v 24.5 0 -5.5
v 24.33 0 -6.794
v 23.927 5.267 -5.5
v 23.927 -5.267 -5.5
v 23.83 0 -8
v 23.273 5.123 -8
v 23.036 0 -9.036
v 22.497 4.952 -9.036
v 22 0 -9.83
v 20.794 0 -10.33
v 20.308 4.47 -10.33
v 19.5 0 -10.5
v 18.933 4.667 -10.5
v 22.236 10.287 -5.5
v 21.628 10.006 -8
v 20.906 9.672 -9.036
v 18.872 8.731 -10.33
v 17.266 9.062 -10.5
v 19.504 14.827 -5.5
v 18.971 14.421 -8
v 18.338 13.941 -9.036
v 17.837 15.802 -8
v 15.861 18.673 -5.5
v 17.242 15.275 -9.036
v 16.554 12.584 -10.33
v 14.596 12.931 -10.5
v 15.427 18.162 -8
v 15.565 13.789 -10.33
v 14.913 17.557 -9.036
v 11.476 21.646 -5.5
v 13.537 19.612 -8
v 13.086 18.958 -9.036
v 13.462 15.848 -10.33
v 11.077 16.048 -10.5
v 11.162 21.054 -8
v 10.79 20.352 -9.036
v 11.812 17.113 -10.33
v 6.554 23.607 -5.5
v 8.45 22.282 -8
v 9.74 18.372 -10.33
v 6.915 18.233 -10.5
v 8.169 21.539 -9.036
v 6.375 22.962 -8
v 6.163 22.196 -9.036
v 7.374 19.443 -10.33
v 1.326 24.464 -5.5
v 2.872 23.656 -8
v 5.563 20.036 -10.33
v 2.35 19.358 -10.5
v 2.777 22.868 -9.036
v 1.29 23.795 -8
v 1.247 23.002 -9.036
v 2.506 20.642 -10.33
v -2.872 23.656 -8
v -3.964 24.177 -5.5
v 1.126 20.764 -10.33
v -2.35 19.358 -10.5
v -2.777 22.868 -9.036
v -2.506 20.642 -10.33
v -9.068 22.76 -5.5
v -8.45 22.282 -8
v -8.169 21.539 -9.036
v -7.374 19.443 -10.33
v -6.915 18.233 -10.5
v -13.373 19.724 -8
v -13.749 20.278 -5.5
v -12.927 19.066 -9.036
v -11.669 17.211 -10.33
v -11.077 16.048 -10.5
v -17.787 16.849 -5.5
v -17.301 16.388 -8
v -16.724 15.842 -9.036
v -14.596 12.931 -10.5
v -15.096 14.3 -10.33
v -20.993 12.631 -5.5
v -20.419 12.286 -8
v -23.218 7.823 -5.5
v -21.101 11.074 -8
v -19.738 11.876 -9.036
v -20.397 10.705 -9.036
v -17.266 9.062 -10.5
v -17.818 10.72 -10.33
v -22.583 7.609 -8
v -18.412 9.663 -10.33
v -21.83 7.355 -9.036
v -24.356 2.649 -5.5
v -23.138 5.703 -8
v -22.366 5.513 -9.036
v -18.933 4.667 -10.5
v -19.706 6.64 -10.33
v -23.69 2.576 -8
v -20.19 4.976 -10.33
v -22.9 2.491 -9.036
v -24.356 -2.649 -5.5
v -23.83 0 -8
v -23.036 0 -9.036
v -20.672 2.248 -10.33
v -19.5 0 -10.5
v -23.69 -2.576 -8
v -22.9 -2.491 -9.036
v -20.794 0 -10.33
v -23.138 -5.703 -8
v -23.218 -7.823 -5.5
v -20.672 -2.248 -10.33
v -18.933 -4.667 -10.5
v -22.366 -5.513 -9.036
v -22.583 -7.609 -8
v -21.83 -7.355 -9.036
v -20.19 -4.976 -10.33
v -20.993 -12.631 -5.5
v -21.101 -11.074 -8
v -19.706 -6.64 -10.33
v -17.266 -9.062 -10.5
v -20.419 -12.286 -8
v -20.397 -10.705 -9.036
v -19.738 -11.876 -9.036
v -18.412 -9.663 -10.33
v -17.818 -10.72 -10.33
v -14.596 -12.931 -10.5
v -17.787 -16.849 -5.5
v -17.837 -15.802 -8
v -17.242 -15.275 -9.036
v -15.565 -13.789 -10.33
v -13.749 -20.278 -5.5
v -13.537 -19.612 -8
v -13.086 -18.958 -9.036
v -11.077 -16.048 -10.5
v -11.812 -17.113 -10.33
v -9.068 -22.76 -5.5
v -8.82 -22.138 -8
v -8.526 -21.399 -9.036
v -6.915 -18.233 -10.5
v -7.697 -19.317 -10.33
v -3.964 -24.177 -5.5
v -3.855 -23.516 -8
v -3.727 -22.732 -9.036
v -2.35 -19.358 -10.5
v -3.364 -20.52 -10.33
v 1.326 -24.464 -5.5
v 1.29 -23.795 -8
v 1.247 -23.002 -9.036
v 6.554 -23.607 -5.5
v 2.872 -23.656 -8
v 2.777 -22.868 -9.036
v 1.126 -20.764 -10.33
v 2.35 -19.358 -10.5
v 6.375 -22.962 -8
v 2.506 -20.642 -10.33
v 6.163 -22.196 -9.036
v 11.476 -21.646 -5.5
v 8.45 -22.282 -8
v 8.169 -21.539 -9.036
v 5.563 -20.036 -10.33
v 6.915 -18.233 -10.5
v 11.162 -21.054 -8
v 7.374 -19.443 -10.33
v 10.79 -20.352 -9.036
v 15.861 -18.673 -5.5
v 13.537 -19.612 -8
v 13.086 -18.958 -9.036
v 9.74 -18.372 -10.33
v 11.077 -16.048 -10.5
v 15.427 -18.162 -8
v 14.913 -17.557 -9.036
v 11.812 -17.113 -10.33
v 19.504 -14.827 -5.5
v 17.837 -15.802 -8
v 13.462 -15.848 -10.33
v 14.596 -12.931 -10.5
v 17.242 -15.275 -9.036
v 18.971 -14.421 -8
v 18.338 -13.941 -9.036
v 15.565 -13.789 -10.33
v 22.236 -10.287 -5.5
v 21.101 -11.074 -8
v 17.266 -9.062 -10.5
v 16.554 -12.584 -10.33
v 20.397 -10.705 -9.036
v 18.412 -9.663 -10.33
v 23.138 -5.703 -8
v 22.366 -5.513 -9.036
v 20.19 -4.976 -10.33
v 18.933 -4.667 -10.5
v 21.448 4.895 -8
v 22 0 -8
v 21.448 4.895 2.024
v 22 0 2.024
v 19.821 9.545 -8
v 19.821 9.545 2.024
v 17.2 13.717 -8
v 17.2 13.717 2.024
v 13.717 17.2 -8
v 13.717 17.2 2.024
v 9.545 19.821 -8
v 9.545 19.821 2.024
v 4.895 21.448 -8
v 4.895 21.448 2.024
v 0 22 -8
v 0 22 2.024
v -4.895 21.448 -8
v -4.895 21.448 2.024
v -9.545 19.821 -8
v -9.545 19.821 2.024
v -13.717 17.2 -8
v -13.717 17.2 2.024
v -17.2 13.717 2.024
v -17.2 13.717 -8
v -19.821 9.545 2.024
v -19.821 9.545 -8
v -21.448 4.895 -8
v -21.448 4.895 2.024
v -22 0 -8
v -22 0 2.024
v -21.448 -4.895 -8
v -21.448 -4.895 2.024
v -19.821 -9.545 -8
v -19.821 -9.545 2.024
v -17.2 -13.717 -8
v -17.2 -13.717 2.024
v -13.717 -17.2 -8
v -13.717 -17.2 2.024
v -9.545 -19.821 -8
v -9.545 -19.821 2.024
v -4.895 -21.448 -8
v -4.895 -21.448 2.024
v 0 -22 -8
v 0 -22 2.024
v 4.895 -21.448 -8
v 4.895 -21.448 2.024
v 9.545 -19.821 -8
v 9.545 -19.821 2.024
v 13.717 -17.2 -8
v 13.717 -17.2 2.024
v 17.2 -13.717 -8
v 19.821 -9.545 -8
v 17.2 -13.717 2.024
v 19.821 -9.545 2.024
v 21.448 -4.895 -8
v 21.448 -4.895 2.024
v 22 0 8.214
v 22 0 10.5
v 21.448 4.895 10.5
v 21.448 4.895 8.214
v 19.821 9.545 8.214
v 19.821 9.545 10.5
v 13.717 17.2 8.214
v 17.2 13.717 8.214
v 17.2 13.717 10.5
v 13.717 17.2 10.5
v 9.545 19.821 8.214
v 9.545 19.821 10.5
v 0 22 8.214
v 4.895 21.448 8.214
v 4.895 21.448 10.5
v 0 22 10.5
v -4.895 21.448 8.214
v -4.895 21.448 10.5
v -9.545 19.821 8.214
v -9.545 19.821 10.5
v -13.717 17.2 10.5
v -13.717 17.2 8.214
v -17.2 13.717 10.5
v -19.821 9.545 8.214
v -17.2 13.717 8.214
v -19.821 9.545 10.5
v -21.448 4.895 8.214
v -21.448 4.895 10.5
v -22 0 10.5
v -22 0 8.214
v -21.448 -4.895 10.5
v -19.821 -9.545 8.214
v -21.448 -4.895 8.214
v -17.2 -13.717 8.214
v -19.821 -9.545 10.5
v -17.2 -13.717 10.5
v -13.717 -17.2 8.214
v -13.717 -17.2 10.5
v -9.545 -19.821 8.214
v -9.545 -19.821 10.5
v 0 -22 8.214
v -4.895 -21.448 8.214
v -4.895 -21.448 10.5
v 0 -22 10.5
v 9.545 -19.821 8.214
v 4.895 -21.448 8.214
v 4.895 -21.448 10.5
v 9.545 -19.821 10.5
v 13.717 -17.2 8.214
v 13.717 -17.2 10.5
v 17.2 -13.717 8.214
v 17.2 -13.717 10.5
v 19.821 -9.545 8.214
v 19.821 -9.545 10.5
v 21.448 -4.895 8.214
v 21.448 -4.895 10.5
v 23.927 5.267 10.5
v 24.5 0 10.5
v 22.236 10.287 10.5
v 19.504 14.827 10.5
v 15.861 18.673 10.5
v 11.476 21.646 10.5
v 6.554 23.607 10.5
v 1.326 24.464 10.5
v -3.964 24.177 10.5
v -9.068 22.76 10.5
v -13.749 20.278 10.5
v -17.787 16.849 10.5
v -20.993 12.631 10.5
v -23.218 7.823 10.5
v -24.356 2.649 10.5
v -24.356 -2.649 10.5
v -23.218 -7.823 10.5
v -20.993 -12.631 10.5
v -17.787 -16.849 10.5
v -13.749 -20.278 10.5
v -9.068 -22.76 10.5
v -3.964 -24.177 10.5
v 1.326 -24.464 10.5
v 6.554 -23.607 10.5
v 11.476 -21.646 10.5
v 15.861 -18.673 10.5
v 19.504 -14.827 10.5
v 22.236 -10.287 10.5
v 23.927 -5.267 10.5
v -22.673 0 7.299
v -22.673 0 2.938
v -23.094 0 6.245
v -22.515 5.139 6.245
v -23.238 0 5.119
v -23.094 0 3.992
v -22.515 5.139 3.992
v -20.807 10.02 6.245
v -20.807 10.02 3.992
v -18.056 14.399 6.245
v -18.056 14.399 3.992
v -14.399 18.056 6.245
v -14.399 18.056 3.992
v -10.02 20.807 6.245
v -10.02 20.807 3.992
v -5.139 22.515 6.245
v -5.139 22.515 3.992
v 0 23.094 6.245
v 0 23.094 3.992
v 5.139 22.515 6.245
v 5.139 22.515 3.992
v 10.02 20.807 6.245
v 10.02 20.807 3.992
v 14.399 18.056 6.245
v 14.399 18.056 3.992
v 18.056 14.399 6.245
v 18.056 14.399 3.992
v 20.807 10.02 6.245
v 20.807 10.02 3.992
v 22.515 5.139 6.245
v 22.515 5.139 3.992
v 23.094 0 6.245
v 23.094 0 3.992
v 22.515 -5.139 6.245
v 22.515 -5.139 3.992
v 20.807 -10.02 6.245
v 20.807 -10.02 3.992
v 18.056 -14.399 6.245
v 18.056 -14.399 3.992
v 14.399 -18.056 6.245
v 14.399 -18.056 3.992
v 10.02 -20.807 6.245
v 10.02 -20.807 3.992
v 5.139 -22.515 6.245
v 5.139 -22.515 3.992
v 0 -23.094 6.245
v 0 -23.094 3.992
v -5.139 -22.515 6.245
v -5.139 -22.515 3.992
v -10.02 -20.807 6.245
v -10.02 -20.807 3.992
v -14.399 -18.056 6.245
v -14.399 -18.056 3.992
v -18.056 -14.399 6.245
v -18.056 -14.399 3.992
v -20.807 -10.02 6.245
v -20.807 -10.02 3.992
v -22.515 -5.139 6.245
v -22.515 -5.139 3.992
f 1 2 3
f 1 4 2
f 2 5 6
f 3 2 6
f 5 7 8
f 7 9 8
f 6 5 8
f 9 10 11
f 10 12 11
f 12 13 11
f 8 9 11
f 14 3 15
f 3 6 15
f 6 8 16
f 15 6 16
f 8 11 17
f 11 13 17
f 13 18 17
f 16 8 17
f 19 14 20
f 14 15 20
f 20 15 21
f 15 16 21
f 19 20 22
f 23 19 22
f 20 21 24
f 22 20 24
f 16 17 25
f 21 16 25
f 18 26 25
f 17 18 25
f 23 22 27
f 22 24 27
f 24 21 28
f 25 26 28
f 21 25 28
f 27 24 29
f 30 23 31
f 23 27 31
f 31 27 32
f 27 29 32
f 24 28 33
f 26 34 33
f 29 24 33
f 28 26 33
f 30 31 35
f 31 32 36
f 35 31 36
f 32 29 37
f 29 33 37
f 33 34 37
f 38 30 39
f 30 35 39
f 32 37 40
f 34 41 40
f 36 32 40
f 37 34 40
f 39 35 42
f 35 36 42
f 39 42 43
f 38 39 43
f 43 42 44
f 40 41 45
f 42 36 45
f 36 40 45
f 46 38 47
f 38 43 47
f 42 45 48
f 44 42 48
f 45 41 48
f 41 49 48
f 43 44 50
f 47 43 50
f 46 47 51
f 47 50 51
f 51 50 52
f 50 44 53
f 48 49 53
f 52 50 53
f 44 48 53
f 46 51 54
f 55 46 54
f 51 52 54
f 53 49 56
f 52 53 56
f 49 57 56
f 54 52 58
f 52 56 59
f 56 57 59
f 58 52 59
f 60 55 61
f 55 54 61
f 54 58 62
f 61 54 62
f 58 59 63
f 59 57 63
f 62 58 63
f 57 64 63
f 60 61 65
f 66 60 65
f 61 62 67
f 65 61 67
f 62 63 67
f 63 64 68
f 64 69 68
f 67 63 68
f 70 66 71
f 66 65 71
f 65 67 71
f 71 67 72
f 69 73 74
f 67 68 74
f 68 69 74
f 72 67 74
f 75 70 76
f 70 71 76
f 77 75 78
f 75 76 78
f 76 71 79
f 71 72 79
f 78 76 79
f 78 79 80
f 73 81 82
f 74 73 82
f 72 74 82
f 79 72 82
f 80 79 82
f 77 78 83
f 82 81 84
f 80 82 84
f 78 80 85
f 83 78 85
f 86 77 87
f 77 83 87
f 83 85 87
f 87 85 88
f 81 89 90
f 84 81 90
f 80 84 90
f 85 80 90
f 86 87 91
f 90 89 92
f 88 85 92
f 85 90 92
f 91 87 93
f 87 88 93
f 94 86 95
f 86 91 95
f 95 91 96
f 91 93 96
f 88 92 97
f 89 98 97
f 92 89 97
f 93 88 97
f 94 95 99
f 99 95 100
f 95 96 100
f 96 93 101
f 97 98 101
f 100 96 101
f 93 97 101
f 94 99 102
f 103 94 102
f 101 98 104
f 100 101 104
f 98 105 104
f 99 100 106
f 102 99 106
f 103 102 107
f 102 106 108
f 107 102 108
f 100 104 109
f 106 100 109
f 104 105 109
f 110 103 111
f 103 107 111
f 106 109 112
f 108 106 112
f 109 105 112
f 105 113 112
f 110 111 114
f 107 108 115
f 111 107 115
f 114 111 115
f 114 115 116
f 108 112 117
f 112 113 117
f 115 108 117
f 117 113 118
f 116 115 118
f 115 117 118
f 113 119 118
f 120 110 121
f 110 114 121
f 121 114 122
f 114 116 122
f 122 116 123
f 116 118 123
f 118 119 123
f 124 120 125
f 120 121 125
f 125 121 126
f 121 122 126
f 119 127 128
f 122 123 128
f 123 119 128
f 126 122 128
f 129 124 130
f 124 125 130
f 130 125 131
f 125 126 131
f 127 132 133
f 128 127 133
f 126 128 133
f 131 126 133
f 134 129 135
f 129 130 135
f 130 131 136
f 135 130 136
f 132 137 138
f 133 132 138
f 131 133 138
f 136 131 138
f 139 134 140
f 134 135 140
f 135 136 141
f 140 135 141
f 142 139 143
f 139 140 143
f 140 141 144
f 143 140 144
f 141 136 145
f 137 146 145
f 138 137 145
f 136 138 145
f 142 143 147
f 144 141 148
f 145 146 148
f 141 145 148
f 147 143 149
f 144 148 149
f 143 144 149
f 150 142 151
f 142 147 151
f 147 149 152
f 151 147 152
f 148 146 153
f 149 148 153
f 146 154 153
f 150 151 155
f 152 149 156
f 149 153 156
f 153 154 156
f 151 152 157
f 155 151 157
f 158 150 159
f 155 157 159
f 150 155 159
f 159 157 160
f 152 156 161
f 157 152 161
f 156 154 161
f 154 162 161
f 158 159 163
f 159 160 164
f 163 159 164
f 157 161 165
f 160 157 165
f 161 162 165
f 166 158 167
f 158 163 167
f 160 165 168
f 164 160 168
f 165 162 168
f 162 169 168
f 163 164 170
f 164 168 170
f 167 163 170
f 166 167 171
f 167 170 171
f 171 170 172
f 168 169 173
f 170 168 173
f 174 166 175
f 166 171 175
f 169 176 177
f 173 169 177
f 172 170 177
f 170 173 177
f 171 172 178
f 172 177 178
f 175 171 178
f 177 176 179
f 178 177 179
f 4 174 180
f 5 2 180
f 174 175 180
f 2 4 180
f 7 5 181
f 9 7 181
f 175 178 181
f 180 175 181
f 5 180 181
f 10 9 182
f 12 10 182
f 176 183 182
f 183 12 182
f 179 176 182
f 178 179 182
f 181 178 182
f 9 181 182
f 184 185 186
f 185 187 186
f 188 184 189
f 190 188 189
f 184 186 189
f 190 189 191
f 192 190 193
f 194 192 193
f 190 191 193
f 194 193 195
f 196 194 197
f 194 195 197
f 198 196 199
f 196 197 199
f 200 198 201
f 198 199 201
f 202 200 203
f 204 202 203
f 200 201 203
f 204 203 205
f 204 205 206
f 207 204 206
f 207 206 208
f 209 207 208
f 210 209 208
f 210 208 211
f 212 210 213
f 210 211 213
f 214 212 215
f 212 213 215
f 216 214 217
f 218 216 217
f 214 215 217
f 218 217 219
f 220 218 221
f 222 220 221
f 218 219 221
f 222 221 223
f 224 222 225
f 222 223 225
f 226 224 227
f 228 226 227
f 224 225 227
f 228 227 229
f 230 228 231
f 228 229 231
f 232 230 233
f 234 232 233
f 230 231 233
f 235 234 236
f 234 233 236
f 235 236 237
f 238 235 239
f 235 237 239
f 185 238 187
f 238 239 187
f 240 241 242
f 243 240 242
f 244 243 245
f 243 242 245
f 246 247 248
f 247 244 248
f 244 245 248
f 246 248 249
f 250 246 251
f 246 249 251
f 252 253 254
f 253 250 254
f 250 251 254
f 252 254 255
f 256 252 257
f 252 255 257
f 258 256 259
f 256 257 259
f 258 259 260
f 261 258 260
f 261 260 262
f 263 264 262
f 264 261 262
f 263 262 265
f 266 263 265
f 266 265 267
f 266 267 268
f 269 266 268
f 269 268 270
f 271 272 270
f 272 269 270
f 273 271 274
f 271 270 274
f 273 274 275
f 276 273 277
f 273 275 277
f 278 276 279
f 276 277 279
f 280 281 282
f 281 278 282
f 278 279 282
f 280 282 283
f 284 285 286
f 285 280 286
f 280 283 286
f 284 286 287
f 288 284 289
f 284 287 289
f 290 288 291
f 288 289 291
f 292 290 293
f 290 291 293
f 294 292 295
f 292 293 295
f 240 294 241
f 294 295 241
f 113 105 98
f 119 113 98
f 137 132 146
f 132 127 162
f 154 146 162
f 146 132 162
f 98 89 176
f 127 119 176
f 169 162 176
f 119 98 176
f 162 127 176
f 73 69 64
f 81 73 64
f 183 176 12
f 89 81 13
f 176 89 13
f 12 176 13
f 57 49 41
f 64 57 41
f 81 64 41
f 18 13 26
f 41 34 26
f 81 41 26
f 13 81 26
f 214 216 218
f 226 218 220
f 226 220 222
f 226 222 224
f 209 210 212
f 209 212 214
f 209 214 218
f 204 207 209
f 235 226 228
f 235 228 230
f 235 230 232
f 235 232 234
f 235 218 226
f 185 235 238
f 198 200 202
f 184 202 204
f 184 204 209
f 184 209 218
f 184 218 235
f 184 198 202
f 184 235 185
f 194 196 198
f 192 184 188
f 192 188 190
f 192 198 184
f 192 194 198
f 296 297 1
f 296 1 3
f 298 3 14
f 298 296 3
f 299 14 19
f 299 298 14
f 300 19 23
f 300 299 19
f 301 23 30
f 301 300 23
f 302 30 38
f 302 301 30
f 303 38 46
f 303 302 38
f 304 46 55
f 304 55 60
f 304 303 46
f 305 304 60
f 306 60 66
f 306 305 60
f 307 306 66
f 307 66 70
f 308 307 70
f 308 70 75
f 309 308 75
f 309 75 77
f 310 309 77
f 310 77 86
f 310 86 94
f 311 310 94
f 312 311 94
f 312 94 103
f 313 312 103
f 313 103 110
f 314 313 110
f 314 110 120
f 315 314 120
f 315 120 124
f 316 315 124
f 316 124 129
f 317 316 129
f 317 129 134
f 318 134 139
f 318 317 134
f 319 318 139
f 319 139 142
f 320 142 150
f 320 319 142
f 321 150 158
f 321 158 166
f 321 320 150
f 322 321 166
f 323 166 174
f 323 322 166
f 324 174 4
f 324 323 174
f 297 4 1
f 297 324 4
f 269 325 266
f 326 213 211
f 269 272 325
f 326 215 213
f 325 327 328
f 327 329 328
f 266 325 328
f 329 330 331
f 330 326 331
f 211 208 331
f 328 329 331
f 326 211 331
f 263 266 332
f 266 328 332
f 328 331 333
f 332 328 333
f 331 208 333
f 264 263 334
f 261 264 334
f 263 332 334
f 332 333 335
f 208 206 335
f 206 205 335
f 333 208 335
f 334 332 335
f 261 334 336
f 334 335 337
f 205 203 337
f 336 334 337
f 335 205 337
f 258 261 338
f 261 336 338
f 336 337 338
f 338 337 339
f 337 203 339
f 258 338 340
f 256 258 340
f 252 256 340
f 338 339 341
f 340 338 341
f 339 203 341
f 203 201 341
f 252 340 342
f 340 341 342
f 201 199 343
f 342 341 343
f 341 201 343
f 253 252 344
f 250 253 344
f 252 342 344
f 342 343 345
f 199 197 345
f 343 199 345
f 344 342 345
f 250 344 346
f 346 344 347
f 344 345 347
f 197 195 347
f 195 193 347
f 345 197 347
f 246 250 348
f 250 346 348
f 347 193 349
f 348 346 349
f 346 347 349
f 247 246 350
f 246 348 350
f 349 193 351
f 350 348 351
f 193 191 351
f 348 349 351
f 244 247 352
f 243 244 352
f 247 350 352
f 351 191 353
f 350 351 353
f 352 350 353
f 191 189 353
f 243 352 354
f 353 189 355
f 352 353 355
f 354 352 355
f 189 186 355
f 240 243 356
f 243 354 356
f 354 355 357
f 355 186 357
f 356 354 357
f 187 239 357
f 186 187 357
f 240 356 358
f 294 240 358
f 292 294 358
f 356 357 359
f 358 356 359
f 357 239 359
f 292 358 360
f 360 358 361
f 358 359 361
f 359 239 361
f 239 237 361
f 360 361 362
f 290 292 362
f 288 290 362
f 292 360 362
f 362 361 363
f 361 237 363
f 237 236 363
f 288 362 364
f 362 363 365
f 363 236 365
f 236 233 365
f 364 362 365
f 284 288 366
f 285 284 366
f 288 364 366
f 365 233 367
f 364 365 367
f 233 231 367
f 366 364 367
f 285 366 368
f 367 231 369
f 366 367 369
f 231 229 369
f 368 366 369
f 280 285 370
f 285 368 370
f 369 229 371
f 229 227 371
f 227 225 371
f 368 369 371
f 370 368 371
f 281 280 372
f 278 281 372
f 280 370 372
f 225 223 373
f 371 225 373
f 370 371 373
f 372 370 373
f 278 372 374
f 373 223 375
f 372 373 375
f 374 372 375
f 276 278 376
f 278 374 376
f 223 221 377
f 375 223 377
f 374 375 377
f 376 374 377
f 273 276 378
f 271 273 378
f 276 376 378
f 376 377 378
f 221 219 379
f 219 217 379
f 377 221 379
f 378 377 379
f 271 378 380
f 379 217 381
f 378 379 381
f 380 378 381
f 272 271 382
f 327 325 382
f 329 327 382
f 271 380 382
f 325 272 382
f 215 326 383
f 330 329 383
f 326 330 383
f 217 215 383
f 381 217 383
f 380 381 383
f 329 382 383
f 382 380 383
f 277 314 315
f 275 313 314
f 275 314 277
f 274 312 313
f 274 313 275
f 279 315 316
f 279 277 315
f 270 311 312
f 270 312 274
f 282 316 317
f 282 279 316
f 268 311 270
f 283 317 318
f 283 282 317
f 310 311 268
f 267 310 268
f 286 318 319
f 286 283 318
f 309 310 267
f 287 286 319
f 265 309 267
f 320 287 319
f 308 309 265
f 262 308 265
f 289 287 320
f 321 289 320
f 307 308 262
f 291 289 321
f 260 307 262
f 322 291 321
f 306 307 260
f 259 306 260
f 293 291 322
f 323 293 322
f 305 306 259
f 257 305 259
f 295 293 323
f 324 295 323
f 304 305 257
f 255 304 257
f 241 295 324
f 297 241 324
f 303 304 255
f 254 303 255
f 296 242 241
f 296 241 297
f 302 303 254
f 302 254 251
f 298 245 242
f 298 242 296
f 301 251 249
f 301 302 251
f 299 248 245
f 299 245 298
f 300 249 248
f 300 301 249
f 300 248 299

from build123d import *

# Parameters (mm, degrees)
F0_R     = 24.5
F1_DEPTH = 10.5
F2_T     = -2.5
F5_R     = 5


with BuildPart() as f1:
    # F0 (on Top) → F1 (new body, symmetric)
    with BuildSketch(Plane.XY):
        Circle(F0_R)
    extrude(amount=F1_DEPTH, both=True)

    # F2
    f2_openings = [f1.faces().sort_by_distance(p)[0] for p in [
        (0, 0, 10.5),
    ]]
    offset(amount=F2_T, openings=f2_openings)

    # F3 (on Front) → F4 (revolve, cut)
    with BuildSketch(Plane.XZ):
        with BuildLine():
            Line((-22, 2.023608), (-22, 8.213608))
            ThreePointArc((-22, 8.213608), (-23.237886, 5.118608), (-22, 2.023608))
        make_face()
    revolve(axis=Axis((0, 0, 3.342178), (0, 0, -1)), mode=Mode.SUBTRACT)

    # F5
    f5_edges = [f1.edges().sort_by_distance(p)[0] for p in [
        (-24.5, 0, -10.5),
    ]]
    fillet(f5_edges, radius=F5_R)


solid = f1.part
